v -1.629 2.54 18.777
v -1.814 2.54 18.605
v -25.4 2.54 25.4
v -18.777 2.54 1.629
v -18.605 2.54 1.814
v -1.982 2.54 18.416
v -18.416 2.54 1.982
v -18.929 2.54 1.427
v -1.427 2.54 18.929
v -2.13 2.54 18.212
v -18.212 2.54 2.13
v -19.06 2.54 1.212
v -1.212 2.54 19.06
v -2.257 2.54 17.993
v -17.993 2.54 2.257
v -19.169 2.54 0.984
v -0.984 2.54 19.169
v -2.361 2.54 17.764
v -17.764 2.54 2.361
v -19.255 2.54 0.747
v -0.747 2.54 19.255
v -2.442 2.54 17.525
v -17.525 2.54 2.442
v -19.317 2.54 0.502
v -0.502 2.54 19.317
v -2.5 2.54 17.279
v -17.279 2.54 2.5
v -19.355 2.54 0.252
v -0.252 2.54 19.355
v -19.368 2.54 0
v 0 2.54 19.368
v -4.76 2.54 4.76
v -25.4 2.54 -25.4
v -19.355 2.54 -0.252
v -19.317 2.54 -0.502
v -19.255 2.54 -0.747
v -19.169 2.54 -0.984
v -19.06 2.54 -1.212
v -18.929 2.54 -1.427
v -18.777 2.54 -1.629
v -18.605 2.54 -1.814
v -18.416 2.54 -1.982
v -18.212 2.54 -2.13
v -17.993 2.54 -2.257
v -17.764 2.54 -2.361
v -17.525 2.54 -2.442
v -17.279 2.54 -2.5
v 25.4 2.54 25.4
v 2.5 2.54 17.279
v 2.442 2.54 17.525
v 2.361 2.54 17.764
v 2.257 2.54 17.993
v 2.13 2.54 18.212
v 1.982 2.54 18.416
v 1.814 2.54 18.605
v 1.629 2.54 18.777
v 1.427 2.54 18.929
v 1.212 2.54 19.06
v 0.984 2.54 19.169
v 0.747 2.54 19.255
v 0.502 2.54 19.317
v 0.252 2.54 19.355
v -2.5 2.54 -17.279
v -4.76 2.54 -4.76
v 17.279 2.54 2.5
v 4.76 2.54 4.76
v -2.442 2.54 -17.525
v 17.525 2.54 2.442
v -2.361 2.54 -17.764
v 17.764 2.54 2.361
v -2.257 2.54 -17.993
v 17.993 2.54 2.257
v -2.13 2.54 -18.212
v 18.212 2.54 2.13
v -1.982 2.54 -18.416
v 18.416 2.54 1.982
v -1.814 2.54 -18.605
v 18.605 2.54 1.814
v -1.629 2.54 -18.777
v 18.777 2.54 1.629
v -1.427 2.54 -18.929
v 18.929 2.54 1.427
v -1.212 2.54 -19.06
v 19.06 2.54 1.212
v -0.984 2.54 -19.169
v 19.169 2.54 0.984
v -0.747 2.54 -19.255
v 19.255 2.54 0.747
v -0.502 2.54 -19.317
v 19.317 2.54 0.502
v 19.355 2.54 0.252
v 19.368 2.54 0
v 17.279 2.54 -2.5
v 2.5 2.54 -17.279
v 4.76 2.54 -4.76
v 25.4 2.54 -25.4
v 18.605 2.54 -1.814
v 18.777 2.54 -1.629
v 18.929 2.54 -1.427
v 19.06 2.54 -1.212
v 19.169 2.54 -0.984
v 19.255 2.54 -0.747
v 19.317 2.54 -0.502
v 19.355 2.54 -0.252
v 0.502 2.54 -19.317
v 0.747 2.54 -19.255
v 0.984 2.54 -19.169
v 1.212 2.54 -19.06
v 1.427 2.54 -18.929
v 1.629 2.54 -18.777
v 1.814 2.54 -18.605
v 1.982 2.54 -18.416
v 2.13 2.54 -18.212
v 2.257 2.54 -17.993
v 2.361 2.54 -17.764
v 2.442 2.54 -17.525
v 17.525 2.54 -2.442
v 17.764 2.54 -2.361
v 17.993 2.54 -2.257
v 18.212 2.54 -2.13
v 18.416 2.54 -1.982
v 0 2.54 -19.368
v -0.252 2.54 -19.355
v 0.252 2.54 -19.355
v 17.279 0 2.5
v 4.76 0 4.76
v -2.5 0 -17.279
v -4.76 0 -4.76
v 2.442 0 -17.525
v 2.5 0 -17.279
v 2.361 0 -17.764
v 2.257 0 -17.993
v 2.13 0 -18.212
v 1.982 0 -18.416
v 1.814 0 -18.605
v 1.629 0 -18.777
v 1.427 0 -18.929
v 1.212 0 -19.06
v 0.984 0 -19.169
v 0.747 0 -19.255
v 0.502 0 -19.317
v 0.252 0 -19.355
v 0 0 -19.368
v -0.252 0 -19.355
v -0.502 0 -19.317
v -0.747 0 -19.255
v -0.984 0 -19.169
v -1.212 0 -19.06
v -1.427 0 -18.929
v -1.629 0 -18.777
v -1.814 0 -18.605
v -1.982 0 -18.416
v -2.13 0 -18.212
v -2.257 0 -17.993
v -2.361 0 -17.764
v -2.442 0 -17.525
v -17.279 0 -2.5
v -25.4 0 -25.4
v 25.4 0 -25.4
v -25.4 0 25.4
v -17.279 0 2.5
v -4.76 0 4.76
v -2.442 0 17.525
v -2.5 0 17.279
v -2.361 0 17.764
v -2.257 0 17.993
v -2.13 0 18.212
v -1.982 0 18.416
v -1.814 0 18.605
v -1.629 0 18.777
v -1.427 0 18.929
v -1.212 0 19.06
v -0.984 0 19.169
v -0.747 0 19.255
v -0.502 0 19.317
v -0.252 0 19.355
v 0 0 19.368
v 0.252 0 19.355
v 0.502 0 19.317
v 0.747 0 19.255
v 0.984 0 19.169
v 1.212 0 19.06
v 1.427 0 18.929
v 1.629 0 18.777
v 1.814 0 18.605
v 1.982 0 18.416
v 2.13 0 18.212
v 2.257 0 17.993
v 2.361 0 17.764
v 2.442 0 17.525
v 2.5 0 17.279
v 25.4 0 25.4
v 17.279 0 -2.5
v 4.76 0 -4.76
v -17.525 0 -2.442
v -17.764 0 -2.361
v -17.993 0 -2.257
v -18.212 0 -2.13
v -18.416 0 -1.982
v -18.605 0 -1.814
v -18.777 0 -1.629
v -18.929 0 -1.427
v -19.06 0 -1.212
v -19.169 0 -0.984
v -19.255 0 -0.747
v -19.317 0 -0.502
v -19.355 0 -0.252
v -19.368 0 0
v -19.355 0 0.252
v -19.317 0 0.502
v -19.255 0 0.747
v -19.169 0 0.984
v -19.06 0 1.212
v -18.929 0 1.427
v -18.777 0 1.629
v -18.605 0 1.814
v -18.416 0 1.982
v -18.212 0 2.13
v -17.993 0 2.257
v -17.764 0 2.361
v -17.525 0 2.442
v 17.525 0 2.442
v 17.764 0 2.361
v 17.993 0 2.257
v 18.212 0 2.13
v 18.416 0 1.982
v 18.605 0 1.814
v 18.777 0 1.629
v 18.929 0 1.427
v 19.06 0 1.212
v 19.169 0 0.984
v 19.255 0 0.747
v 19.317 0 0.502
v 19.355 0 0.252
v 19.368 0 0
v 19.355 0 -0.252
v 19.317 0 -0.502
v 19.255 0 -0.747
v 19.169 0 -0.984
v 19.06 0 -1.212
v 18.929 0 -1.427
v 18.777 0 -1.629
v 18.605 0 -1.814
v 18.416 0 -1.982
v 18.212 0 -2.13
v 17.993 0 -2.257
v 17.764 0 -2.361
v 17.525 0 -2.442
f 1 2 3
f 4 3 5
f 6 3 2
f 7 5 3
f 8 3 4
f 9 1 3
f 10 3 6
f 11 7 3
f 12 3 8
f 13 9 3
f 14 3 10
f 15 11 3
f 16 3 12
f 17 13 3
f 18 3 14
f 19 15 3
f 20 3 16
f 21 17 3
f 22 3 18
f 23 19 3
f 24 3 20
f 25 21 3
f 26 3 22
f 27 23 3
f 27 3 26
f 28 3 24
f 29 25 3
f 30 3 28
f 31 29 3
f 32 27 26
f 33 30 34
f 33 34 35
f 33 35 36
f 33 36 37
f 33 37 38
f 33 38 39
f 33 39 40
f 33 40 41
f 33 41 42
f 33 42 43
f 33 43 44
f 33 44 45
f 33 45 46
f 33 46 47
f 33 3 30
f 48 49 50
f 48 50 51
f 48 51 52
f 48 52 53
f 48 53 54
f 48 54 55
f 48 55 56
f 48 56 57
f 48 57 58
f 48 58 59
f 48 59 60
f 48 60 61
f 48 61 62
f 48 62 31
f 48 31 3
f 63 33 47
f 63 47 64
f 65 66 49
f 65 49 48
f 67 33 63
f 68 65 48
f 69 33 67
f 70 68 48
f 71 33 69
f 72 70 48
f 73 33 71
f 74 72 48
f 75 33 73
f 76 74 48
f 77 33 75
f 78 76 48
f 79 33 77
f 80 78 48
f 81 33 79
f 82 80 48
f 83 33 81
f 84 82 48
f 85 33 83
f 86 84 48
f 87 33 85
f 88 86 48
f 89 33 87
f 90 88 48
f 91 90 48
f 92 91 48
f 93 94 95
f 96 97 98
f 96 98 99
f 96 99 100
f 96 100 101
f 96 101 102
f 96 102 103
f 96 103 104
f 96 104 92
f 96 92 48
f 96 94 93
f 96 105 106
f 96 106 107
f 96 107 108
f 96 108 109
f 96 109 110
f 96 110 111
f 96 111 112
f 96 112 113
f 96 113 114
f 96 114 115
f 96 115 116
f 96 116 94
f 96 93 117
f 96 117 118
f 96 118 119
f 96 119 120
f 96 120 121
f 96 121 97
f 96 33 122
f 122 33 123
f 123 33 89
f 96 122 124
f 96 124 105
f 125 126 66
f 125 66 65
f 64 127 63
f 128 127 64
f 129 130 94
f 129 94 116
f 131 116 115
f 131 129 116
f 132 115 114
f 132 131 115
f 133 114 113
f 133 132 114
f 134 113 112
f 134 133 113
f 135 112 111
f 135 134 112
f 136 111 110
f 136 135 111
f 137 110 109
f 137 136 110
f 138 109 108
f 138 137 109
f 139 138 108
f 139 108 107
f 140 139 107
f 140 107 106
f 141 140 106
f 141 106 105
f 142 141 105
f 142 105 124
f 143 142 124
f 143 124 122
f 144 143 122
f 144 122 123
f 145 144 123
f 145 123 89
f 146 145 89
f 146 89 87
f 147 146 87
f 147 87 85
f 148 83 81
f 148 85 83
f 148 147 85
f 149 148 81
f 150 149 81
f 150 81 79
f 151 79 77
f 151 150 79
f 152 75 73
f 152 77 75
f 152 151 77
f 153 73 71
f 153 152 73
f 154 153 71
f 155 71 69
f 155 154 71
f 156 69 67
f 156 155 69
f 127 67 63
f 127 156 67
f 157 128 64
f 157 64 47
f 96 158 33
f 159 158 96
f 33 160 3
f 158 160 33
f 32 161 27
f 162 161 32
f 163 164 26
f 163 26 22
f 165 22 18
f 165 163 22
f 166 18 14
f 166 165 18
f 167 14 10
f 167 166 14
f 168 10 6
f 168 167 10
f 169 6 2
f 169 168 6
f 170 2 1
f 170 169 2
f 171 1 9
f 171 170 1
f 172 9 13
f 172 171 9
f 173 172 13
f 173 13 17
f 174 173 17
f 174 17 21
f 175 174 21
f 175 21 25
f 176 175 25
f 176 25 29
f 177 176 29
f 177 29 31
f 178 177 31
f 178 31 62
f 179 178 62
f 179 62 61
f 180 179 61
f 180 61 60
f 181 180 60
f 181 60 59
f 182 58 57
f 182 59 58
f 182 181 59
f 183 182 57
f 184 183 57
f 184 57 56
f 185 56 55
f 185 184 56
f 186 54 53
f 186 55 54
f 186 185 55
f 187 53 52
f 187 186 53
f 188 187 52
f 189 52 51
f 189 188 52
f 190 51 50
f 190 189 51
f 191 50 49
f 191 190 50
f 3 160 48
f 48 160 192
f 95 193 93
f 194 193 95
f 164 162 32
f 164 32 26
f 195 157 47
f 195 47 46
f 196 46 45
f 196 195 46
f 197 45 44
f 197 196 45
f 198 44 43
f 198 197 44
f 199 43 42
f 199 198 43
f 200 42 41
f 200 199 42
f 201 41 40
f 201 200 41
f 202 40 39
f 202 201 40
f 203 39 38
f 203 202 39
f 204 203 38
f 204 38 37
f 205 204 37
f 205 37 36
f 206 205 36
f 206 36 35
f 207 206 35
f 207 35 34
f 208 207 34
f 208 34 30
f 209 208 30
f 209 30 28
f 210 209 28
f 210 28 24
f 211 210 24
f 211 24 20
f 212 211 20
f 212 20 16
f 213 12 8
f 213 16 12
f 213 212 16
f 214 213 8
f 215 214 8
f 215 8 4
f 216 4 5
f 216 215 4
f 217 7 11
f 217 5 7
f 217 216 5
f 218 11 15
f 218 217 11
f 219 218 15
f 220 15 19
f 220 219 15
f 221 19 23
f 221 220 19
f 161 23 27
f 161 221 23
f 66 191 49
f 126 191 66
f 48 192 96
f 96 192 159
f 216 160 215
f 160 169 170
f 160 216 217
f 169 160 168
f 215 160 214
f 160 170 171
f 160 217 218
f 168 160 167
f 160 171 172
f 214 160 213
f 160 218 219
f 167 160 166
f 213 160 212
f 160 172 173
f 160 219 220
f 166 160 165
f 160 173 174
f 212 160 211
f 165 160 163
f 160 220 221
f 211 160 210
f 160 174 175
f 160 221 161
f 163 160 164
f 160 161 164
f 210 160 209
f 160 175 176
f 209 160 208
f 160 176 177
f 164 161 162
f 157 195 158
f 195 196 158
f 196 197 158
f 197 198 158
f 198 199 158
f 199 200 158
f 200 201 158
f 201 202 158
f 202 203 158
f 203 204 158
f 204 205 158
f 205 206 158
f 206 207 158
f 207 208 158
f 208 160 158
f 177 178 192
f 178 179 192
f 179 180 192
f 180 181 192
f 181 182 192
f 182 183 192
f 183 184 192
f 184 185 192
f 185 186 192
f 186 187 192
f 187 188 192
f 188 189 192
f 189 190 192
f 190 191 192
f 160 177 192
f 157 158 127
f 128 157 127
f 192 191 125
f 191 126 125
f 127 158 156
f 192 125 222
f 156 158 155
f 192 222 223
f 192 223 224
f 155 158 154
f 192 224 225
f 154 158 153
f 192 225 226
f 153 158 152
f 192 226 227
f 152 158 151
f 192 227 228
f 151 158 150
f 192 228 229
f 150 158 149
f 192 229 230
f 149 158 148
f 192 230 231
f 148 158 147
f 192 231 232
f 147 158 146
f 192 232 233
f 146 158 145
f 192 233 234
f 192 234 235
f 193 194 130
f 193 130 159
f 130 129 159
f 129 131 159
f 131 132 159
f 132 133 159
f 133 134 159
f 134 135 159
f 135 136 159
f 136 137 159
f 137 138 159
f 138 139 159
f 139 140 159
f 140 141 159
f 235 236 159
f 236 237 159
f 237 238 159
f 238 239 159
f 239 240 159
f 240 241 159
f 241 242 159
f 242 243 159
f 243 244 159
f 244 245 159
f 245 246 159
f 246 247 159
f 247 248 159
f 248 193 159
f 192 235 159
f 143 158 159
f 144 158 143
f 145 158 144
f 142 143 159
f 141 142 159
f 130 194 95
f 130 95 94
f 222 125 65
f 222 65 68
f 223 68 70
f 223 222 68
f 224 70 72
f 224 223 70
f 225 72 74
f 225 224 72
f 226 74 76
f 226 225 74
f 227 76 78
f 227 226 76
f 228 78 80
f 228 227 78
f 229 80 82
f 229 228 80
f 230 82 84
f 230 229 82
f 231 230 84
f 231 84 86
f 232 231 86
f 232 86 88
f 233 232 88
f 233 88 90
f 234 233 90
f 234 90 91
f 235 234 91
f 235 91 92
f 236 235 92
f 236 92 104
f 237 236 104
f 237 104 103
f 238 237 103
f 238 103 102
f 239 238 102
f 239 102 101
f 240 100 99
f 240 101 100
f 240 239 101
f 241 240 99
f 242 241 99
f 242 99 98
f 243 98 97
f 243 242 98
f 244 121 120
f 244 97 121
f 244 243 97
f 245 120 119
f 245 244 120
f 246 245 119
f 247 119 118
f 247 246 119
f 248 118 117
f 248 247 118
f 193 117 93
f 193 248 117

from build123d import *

# Parameters (mm, degrees)
SKETCH1_W           = 50.8
SKETCH1_H           = 50.8
BOSS_EXTRUDE1_DEPTH = 2.54
CUT_EXTRUDE1_DEPTH  = 3.54


with BuildPart() as part:
    # Sketch1 → Boss-Extrude1 (new body)
    with BuildSketch(Plane(origin=(0, 0, 0), x_dir=(1, 0, 0), z_dir=(0, 1, 0))):
        Rectangle(SKETCH1_W, SKETCH1_H)
    extrude(amount=BOSS_EXTRUDE1_DEPTH)

    # Sketch2 → Cut-Extrude1 (cut, through all)
    with BuildSketch(Plane.XZ):
        with BuildLine():
            Line((-4.759535744, 4.759535744), (-2.499599665, 17.278722247))
            ThreePointArc((-2.499599665, 17.278722247), (0, 19.3675), (2.499599665, 17.278722247))
            Line((2.499599665, 17.278722247), (4.759535744, 4.759535744))
            Line((4.759535744, 4.759535744), (17.278722247, 2.499599665))
            ThreePointArc((17.278722247, 2.499599665), (19.3675, 0), (17.278722247, -2.499599665))
            Line((17.278722247, -2.499599665), (4.759535744, -4.759535744))
            Line((4.759535744, -4.759535744), (2.499599665, -17.278722247))
            ThreePointArc((2.499599665, -17.278722247), (0, -19.3675), (-2.499599665, -17.278722247))
            Line((-2.499599665, -17.278722247), (-4.759535744, -4.759535744))
            Line((-4.759535744, -4.759535744), (-17.278722247, -2.499599665))
            ThreePointArc((-17.278722247, -2.499599665), (-19.3675, 0), (-17.278722247, 2.499599665))
            Line((-17.278722247, 2.499599665), (-4.759535744, 4.759535744))
        make_face()
    extrude(amount=-CUT_EXTRUDE1_DEPTH, mode=Mode.SUBTRACT)


solid = part.part
